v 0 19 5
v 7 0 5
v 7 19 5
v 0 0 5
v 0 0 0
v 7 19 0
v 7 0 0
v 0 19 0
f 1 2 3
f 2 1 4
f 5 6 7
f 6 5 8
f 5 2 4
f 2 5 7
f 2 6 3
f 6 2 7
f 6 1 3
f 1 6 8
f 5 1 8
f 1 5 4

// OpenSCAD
// Generated by SolidPython 1.0.1 on 2020-07-29 00:46:55


cube(size = [7, 19, 5]);
/***********************************************
*********      SolidPython code:      **********
************************************************
 
# import packages: SolidPython
from solid import *
from solid.utils import *
from itertools import chain, combinations, permutations


class Resize:

    def __init__(self, scad_file):
        self.scad_file = scad_file
        #self.scad_file = import_scad(scad_file)
        # cone/cylinder param:
        self.r1 = 0
        self.r2 = 0
        self.h = 0
        # rectangular prism param:
        self.w = 0
        self.l = 0
        # ellipse param:
        self.r = 0

    # import OpenScad code (file name corresponds to shape)


    # classify shape + parameters
    def assign(self, param1, param2, param3):
        if self.scad_file == 'cone.scad':
            self.r1 = param1
            self.r2 = param2
            self.h = param3
        elif self.scad_file == 'cylinder.scad':
            self.r1 = param1
            self.r2 = param2
            self.h = param3
        elif self.scad_file == 'rectangularPrism.scad':
            self.h = param1
            self.l = param2
            self.w = param3
        else:
            self.r = param1
            self.h = param2

    # resize parameters
    def iterate(self):
        x = range(3, 20, 2)
        i = 1
        if self.scad_file == 'cone.scad':
            tempList = list(permutations(x, 2))
            for temp in tempList:
                param1 = temp[0]
                param2 = temp[1]
                filepath = 'produced_scad_files/' + 'cone' + str(param1) + '_' + str(param2) + '_' + '.scad'
                scad_render_to_file(cylinder(h=param1, r1=param2, r2=0), filepath)

        elif self.scad_file == 'cylinder.scad':
            tempList = list(permutations(x, 3))
            for temp in tempList:
                param1 = temp[0]
                param2 = temp[1]
                filepath = 'produced_scad_files/' + 'cylinder' + str(param1) + '_' + str(param2) + '_' + '.scad'
                scad_render_to_file(cylinder(h=param1, r1=param2, r2=param2), filepath)

        elif self.scad_file == 'rectangularPrism.scad':
            tempList = list(permutations(x, 3))
            for temp in tempList:
                param1 = temp[0]
                param2 = temp[1]
                param3 = temp[2]
                filepath = 'produced_scad_files/' + 'rectangularPrism' + str(param1) + '_' + str(param2) + '_' + str(
                    param3) + '.scad'
                scad_render_to_file(cube(size=(param1, param2, param3)), filepath)

        elif self.scad_file == 'ellipse.scad':
            tempList = list(permutations(x, 4))
            for temp in tempList:
                param1 = temp[0]
                param2 = temp[1]
                param3 = temp[2]
                param4 = temp[3]
                filepath = 'produced_scad_files/' + 'ellipse' + str(param1) + '_' + str(param2) + '_' + str(param3) + '_' + str(param4) + '.scad'
                scad_render_to_file(scale([param1, param2, param3])(sphere(r=param4)), filepath)

    def render_to_scadfile(self):
        scad_render_to_file(scad, 'example.scad') 
 
************************************************/
